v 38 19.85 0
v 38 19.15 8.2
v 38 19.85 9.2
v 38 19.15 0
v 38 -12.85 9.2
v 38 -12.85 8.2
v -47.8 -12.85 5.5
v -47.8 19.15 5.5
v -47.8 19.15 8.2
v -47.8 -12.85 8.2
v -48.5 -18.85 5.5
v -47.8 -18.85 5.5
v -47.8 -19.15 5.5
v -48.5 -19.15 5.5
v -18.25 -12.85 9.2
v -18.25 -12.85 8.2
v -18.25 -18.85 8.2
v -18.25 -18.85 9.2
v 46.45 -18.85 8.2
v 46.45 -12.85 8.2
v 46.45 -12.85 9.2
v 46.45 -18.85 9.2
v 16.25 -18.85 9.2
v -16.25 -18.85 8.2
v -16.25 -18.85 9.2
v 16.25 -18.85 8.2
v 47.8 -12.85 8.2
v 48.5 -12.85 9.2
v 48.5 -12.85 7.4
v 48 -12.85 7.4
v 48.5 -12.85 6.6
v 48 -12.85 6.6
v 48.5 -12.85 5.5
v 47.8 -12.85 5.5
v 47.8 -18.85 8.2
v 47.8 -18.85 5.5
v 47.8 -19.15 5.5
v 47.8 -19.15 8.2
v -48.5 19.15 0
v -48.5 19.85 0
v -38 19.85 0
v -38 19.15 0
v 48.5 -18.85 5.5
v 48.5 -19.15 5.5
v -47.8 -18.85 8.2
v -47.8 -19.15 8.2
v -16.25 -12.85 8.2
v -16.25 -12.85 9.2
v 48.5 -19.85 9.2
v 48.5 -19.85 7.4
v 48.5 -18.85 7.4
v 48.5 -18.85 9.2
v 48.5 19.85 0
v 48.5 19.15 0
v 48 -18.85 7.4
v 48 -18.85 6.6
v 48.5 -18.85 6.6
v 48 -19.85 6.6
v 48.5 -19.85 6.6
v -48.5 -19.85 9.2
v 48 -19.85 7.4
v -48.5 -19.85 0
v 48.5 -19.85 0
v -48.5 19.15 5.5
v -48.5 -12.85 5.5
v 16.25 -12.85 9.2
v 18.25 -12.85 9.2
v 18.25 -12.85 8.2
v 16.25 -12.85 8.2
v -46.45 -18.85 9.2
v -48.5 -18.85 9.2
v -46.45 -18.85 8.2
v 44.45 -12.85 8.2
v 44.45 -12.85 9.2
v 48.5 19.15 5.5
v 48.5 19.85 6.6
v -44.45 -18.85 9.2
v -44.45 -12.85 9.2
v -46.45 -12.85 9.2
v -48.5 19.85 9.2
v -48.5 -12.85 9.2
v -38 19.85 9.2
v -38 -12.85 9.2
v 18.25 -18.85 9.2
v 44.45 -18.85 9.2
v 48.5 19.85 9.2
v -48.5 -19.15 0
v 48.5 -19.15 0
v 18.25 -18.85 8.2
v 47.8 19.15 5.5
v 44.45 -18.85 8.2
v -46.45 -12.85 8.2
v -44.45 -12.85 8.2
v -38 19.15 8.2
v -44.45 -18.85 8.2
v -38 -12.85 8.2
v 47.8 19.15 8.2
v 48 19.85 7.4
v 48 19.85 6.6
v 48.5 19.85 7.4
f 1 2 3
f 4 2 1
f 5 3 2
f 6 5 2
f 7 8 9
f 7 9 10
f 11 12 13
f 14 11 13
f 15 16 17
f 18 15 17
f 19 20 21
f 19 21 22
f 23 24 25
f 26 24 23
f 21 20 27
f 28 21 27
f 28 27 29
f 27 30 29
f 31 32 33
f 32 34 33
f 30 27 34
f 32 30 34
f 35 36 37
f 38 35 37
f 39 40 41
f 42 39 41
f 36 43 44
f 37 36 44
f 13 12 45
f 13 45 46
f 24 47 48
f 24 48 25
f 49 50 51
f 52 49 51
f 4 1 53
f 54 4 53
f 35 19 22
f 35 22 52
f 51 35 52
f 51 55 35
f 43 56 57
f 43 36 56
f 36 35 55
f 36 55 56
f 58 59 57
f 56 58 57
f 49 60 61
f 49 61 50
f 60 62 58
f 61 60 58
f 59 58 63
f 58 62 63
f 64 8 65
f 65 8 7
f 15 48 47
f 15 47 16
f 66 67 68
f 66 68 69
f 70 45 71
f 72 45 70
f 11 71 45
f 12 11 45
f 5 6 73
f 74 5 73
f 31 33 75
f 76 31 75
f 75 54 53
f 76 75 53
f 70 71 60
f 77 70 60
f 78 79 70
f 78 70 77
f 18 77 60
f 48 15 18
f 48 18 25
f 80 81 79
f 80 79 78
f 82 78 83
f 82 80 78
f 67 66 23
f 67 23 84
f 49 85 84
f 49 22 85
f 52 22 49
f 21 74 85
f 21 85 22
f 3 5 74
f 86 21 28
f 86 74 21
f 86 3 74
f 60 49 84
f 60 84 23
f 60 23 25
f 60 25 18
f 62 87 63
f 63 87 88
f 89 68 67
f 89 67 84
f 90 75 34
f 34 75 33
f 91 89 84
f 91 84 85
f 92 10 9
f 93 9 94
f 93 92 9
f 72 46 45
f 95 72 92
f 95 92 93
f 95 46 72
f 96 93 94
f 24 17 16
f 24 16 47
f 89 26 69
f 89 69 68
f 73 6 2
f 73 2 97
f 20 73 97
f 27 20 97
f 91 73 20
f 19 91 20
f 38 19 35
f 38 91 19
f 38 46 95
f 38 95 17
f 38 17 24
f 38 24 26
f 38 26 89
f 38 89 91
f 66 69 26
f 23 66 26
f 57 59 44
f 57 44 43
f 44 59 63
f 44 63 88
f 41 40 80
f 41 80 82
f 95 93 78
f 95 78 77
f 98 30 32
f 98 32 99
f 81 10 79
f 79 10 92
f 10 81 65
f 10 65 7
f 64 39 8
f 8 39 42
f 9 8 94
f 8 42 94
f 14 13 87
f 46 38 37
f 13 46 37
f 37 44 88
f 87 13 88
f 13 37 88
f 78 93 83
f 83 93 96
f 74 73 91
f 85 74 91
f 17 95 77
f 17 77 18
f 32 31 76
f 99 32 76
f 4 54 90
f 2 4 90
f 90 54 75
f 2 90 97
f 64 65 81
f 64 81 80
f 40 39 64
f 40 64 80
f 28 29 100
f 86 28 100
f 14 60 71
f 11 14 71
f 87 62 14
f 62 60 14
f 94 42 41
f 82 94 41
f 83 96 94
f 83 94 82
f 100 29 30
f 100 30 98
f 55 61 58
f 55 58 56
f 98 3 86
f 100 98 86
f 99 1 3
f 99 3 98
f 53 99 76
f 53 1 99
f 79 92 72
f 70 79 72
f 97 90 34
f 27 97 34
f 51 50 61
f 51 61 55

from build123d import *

# Parameters (mm, degrees)
SKETCH002_W     = 97
SKETCH002_H     = 39.7
PAD002_DEPTH    = 9.2
SKETCH003_W     = 95.6
SKETCH003_H     = 38.3
POCKET_DEPTH    = 8.2
POCKET001_DEPTH = 97.001
SKETCH005_W     = 32.5
SKETCH005_H     = 6
SKETCH005_W_2   = 26.2
SKETCH005_W_3   = 5
POCKET002_DEPTH = 3.701
POCKET003_DEPTH = 32.701
POCKET004_DEPTH = 0.5
SKETCH008_W     = 9.8
SKETCH008_H     = 5
POCKET005_DEPTH = 2


with BuildPart() as part:
    # Sketch002 → Pad002 (new body)
    with BuildSketch(Plane.XY):
        Rectangle(SKETCH002_W, SKETCH002_H)
    extrude(amount=PAD002_DEPTH)

    # Sketch003 (on Face5 of Pad002) → Pocket (cut)
    with BuildSketch(Plane(origin=(0, 0, 0), x_dir=(1, 0, 0), z_dir=(0, 0, -1))):
        Rectangle(SKETCH003_W, SKETCH003_H)
    extrude(amount=-POCKET_DEPTH, mode=Mode.SUBTRACT)

    # Sketch004 (on Face3 of Pocket) → Pocket001 (cut, through all)
    with BuildSketch(Plane.YZ.offset(48.5)):
        Polygon((19.15, 5.5), (-19.15, 5.5), (-19.15, 0), (-19.15, -1), (19.15, -1), (19.15, 0), align=None)
    extrude(amount=-POCKET001_DEPTH, mode=Mode.SUBTRACT)

    # Sketch005 (on Face8 of Pocket001) → Pocket002 (cut, through all)
    with BuildSketch(Plane(origin=(0, 0, 5.5), x_dir=(1, 0, 0), z_dir=(0, 0, -1))):
        with Locations((0, 15.85)):
            Rectangle(SKETCH005_W, SKETCH005_H)
        with Locations((-31.35, 15.85)):
            Rectangle(SKETCH005_W_2, SKETCH005_H)
        with Locations((-48.95, 15.85)):
            Rectangle(SKETCH005_W_3, SKETCH005_H)
        with Locations((31.35, 15.85)):
            Rectangle(SKETCH005_W_2, SKETCH005_H)
        with Locations((48.95, 15.85)):
            Rectangle(SKETCH005_W_3, SKETCH005_H)
    extrude(amount=-POCKET002_DEPTH, mode=Mode.SUBTRACT)

    # Sketch006 (on Face20 of Pocket002) → Pocket003 (cut, through all)
    with BuildSketch(Plane.XZ.offset(12.85)):
        with BuildLine():
            Line((-37, 13.1), (37, 13.1))
            ThreePointArc((38, 12.1), (37.707107, 12.807107), (37, 13.1))
            Line((38, 12.1), (38, -12.1))
            ThreePointArc((37, -13.1), (37.707107, -12.807107), (38, -12.1))
            Line((37, -13.1), (-37, -13.1))
            ThreePointArc((-38, -12.1), (-37.707107, -12.807107), (-37, -13.1))
            Line((-38, -12.1), (-38, 12.1))
            ThreePointArc((-37, 13.1), (-37.707107, 12.807107), (-38, 12.1))
        make_face()
    extrude(amount=-POCKET003_DEPTH, mode=Mode.SUBTRACT)

    # Sketch007 (on Face20 of Pocket003) → Pocket004 (cut)
    with BuildSketch(Plane.YZ.offset(48.5)):
        with BuildLine():
            ThreePointArc((-43.699994, 7.4), (-44.1, 7.000001), (-43.699996, 6.6))
            Line((-43.699996, 6.6), (43.7, 6.6))
            ThreePointArc((43.7, 6.6), (44.1, 7), (43.699999, 7.4))
            Line((-43.699994, 7.4), (43.699999, 7.4))
        make_face()
        with BuildLine():
            ThreePointArc((-43.7, -6.6), (-44.1, -7), (-43.7, -7.4))
            Line((-43.7, -7.4), (43.7, -7.4))
            ThreePointArc((43.7, -7.4), (44.1, -7), (43.7, -6.6))
            Line((-43.7, -6.6), (43.7, -6.6))
        make_face()
    extrude(amount=-POCKET004_DEPTH, mode=Mode.SUBTRACT)

    # Sketch008 (on Face21 of Pocket004) → Pocket005 (cut)
    with BuildSketch(Plane(origin=(0, 19.85, 0), x_dir=(-1, 0, 0), z_dir=(0, 1, 0))):
        with Locations((0, 5)):
            Rectangle(SKETCH008_W, SKETCH008_H)
    extrude(amount=-POCKET005_DEPTH, mode=Mode.SUBTRACT)


solid = part.part
